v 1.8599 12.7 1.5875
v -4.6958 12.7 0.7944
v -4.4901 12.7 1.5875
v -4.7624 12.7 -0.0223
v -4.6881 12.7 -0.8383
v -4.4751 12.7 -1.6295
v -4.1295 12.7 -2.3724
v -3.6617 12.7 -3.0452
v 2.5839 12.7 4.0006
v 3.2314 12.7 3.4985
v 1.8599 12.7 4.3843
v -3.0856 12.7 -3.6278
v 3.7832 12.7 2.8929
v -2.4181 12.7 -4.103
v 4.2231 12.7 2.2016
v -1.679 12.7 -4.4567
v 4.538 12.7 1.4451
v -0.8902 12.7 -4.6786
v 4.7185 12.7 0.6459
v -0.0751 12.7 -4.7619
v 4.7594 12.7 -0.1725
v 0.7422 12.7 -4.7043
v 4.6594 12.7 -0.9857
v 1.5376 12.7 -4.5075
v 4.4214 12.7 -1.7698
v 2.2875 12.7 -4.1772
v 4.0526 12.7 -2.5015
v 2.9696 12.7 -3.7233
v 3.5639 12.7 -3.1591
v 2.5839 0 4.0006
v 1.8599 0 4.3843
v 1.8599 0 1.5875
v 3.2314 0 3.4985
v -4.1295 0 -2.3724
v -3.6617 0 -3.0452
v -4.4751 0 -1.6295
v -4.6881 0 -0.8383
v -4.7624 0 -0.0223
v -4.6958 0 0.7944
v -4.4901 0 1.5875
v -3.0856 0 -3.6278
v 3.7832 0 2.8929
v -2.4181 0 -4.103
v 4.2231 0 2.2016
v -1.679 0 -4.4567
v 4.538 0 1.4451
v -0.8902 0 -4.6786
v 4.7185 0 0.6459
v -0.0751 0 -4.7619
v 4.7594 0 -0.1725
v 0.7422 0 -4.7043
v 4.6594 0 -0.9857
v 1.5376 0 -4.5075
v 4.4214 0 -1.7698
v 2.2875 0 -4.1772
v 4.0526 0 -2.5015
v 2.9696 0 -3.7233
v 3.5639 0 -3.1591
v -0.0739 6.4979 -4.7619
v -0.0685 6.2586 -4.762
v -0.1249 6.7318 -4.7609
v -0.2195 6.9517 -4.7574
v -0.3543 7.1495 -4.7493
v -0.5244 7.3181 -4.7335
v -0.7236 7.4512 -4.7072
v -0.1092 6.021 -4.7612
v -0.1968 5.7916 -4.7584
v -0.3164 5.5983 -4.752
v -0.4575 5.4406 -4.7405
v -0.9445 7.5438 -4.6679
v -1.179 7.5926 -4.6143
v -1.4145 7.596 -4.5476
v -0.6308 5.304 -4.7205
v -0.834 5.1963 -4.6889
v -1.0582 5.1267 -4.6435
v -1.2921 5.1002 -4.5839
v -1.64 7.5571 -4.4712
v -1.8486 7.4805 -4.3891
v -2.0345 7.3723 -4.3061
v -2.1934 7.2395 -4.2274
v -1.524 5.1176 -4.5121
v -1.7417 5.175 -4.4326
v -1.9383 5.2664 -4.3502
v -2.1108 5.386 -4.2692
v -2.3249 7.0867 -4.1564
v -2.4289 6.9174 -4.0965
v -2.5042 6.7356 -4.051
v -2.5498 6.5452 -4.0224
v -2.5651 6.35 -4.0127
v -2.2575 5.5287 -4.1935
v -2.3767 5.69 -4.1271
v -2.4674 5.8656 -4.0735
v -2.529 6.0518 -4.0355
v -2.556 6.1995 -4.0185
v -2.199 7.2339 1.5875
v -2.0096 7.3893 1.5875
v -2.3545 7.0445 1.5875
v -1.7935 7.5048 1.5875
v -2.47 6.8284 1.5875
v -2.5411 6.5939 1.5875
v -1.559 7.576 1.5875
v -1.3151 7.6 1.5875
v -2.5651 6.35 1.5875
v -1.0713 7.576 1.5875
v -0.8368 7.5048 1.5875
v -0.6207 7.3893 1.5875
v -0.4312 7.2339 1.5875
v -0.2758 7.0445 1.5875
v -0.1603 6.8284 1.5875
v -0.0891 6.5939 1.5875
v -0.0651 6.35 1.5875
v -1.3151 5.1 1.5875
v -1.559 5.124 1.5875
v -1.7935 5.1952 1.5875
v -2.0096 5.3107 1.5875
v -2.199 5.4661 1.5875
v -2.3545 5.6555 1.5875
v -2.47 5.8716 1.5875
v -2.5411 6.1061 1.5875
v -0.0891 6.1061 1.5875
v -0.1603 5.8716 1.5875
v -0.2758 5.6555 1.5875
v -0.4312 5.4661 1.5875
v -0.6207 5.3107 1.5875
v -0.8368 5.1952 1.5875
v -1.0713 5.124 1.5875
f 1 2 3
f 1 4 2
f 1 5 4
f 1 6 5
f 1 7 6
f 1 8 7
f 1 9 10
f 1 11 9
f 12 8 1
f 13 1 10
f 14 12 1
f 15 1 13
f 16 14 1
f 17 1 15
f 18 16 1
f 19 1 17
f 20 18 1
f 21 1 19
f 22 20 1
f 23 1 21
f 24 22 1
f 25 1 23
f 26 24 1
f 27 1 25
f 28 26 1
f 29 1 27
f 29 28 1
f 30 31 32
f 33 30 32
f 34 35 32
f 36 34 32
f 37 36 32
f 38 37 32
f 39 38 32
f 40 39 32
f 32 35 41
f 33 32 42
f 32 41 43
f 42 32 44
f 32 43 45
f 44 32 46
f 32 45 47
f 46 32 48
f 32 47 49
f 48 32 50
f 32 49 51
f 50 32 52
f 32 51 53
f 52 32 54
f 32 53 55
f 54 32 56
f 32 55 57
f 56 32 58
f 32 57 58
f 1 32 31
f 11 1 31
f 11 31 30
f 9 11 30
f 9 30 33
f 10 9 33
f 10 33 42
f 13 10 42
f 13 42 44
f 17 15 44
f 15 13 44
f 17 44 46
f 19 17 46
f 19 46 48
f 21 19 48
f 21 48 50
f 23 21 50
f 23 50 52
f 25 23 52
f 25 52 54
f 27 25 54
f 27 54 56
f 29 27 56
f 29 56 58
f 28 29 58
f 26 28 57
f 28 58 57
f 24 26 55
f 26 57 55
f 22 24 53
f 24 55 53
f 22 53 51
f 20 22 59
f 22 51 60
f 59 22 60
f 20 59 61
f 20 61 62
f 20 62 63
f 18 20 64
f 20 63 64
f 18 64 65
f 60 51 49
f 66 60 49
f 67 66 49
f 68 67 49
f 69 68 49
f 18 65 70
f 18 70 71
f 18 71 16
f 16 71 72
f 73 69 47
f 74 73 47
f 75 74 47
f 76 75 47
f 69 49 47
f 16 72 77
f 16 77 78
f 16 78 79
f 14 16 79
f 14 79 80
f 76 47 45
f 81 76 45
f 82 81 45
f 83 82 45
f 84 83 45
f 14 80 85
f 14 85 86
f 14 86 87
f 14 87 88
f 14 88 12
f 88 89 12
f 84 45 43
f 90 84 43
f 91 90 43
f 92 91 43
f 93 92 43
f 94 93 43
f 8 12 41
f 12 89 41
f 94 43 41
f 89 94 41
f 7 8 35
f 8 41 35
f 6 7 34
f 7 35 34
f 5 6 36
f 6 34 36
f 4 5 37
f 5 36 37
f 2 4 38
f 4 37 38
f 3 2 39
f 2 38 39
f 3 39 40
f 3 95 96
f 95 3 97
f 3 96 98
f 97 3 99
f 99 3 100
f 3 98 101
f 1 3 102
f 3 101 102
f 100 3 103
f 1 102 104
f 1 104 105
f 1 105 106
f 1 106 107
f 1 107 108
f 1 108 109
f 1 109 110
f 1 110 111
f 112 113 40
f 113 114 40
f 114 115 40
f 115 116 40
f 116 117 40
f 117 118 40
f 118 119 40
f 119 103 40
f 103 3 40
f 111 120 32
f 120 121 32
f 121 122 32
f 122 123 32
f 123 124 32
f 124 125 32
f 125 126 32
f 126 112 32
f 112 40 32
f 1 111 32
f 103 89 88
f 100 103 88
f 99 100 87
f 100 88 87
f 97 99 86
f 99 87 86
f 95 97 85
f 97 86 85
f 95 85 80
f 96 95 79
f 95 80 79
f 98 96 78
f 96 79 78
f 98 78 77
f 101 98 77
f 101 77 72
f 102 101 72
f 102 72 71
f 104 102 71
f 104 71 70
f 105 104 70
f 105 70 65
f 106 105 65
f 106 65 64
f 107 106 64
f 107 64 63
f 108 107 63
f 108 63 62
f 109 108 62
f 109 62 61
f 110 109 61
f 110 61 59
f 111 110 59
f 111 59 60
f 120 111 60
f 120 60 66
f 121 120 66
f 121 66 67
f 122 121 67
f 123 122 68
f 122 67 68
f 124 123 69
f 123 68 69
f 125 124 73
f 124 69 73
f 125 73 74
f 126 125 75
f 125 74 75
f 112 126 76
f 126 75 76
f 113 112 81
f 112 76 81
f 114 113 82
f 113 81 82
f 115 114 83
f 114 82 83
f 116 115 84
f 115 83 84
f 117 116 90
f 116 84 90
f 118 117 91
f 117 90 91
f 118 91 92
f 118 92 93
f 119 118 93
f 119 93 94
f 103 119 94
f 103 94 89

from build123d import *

# Parameters (mm, degrees)
PROFILE_SKETCH_R       = 4.7625
BOSS_EXTRUDE1_DEPTH    = 12.7
PLATE_RELIEF_CUT_REACH = 14.7
PLATE_RELIEF_SKETCH_W  = 6.35
PLATE_RELIEF_SKETCH_H  = 3.175
M3X0_5_TAPPED_HOLE1_D  = 2.5


with BuildPart() as part:
    # Profile Sketch → Boss-Extrude1 (new body)
    with BuildSketch(Plane(origin=(0, 0, 0), x_dir=(1, 0, 0), z_dir=(0, 1, 0))):
        Circle(PROFILE_SKETCH_R)
    extrude(amount=BOSS_EXTRUDE1_DEPTH)

    # Plate Relief Sketch → Plate Relief Cut (cut, up to next)
    with BuildSketch(Plane.XZ, mode=Mode.PRIVATE) as plate_relief_cut_sk1:
        with Locations((-1.315128061, 3.175)):
            Rectangle(PLATE_RELIEF_SKETCH_W, PLATE_RELIEF_SKETCH_H)
    plate_relief_cut_tool1 = extrude(plate_relief_cut_sk1.sketch, amount=-PLATE_RELIEF_CUT_REACH, mode=Mode.PRIVATE) & part.part
    add(plate_relief_cut_tool1.solids().sort_by_distance((-1.315128, 0, 3.175))[0], mode=Mode.SUBTRACT)

    # M3x0.5 Tapped Hole1 (through all)
    with Locations(Plane(origin=(-1.315128061, 6.35, 1.5875), x_dir=(1, 0, 0), z_dir=(0, 0, 1))):
        with Locations((0, 0)):
            Hole(M3X0_5_TAPPED_HOLE1_D / 2)


solid = part.part
